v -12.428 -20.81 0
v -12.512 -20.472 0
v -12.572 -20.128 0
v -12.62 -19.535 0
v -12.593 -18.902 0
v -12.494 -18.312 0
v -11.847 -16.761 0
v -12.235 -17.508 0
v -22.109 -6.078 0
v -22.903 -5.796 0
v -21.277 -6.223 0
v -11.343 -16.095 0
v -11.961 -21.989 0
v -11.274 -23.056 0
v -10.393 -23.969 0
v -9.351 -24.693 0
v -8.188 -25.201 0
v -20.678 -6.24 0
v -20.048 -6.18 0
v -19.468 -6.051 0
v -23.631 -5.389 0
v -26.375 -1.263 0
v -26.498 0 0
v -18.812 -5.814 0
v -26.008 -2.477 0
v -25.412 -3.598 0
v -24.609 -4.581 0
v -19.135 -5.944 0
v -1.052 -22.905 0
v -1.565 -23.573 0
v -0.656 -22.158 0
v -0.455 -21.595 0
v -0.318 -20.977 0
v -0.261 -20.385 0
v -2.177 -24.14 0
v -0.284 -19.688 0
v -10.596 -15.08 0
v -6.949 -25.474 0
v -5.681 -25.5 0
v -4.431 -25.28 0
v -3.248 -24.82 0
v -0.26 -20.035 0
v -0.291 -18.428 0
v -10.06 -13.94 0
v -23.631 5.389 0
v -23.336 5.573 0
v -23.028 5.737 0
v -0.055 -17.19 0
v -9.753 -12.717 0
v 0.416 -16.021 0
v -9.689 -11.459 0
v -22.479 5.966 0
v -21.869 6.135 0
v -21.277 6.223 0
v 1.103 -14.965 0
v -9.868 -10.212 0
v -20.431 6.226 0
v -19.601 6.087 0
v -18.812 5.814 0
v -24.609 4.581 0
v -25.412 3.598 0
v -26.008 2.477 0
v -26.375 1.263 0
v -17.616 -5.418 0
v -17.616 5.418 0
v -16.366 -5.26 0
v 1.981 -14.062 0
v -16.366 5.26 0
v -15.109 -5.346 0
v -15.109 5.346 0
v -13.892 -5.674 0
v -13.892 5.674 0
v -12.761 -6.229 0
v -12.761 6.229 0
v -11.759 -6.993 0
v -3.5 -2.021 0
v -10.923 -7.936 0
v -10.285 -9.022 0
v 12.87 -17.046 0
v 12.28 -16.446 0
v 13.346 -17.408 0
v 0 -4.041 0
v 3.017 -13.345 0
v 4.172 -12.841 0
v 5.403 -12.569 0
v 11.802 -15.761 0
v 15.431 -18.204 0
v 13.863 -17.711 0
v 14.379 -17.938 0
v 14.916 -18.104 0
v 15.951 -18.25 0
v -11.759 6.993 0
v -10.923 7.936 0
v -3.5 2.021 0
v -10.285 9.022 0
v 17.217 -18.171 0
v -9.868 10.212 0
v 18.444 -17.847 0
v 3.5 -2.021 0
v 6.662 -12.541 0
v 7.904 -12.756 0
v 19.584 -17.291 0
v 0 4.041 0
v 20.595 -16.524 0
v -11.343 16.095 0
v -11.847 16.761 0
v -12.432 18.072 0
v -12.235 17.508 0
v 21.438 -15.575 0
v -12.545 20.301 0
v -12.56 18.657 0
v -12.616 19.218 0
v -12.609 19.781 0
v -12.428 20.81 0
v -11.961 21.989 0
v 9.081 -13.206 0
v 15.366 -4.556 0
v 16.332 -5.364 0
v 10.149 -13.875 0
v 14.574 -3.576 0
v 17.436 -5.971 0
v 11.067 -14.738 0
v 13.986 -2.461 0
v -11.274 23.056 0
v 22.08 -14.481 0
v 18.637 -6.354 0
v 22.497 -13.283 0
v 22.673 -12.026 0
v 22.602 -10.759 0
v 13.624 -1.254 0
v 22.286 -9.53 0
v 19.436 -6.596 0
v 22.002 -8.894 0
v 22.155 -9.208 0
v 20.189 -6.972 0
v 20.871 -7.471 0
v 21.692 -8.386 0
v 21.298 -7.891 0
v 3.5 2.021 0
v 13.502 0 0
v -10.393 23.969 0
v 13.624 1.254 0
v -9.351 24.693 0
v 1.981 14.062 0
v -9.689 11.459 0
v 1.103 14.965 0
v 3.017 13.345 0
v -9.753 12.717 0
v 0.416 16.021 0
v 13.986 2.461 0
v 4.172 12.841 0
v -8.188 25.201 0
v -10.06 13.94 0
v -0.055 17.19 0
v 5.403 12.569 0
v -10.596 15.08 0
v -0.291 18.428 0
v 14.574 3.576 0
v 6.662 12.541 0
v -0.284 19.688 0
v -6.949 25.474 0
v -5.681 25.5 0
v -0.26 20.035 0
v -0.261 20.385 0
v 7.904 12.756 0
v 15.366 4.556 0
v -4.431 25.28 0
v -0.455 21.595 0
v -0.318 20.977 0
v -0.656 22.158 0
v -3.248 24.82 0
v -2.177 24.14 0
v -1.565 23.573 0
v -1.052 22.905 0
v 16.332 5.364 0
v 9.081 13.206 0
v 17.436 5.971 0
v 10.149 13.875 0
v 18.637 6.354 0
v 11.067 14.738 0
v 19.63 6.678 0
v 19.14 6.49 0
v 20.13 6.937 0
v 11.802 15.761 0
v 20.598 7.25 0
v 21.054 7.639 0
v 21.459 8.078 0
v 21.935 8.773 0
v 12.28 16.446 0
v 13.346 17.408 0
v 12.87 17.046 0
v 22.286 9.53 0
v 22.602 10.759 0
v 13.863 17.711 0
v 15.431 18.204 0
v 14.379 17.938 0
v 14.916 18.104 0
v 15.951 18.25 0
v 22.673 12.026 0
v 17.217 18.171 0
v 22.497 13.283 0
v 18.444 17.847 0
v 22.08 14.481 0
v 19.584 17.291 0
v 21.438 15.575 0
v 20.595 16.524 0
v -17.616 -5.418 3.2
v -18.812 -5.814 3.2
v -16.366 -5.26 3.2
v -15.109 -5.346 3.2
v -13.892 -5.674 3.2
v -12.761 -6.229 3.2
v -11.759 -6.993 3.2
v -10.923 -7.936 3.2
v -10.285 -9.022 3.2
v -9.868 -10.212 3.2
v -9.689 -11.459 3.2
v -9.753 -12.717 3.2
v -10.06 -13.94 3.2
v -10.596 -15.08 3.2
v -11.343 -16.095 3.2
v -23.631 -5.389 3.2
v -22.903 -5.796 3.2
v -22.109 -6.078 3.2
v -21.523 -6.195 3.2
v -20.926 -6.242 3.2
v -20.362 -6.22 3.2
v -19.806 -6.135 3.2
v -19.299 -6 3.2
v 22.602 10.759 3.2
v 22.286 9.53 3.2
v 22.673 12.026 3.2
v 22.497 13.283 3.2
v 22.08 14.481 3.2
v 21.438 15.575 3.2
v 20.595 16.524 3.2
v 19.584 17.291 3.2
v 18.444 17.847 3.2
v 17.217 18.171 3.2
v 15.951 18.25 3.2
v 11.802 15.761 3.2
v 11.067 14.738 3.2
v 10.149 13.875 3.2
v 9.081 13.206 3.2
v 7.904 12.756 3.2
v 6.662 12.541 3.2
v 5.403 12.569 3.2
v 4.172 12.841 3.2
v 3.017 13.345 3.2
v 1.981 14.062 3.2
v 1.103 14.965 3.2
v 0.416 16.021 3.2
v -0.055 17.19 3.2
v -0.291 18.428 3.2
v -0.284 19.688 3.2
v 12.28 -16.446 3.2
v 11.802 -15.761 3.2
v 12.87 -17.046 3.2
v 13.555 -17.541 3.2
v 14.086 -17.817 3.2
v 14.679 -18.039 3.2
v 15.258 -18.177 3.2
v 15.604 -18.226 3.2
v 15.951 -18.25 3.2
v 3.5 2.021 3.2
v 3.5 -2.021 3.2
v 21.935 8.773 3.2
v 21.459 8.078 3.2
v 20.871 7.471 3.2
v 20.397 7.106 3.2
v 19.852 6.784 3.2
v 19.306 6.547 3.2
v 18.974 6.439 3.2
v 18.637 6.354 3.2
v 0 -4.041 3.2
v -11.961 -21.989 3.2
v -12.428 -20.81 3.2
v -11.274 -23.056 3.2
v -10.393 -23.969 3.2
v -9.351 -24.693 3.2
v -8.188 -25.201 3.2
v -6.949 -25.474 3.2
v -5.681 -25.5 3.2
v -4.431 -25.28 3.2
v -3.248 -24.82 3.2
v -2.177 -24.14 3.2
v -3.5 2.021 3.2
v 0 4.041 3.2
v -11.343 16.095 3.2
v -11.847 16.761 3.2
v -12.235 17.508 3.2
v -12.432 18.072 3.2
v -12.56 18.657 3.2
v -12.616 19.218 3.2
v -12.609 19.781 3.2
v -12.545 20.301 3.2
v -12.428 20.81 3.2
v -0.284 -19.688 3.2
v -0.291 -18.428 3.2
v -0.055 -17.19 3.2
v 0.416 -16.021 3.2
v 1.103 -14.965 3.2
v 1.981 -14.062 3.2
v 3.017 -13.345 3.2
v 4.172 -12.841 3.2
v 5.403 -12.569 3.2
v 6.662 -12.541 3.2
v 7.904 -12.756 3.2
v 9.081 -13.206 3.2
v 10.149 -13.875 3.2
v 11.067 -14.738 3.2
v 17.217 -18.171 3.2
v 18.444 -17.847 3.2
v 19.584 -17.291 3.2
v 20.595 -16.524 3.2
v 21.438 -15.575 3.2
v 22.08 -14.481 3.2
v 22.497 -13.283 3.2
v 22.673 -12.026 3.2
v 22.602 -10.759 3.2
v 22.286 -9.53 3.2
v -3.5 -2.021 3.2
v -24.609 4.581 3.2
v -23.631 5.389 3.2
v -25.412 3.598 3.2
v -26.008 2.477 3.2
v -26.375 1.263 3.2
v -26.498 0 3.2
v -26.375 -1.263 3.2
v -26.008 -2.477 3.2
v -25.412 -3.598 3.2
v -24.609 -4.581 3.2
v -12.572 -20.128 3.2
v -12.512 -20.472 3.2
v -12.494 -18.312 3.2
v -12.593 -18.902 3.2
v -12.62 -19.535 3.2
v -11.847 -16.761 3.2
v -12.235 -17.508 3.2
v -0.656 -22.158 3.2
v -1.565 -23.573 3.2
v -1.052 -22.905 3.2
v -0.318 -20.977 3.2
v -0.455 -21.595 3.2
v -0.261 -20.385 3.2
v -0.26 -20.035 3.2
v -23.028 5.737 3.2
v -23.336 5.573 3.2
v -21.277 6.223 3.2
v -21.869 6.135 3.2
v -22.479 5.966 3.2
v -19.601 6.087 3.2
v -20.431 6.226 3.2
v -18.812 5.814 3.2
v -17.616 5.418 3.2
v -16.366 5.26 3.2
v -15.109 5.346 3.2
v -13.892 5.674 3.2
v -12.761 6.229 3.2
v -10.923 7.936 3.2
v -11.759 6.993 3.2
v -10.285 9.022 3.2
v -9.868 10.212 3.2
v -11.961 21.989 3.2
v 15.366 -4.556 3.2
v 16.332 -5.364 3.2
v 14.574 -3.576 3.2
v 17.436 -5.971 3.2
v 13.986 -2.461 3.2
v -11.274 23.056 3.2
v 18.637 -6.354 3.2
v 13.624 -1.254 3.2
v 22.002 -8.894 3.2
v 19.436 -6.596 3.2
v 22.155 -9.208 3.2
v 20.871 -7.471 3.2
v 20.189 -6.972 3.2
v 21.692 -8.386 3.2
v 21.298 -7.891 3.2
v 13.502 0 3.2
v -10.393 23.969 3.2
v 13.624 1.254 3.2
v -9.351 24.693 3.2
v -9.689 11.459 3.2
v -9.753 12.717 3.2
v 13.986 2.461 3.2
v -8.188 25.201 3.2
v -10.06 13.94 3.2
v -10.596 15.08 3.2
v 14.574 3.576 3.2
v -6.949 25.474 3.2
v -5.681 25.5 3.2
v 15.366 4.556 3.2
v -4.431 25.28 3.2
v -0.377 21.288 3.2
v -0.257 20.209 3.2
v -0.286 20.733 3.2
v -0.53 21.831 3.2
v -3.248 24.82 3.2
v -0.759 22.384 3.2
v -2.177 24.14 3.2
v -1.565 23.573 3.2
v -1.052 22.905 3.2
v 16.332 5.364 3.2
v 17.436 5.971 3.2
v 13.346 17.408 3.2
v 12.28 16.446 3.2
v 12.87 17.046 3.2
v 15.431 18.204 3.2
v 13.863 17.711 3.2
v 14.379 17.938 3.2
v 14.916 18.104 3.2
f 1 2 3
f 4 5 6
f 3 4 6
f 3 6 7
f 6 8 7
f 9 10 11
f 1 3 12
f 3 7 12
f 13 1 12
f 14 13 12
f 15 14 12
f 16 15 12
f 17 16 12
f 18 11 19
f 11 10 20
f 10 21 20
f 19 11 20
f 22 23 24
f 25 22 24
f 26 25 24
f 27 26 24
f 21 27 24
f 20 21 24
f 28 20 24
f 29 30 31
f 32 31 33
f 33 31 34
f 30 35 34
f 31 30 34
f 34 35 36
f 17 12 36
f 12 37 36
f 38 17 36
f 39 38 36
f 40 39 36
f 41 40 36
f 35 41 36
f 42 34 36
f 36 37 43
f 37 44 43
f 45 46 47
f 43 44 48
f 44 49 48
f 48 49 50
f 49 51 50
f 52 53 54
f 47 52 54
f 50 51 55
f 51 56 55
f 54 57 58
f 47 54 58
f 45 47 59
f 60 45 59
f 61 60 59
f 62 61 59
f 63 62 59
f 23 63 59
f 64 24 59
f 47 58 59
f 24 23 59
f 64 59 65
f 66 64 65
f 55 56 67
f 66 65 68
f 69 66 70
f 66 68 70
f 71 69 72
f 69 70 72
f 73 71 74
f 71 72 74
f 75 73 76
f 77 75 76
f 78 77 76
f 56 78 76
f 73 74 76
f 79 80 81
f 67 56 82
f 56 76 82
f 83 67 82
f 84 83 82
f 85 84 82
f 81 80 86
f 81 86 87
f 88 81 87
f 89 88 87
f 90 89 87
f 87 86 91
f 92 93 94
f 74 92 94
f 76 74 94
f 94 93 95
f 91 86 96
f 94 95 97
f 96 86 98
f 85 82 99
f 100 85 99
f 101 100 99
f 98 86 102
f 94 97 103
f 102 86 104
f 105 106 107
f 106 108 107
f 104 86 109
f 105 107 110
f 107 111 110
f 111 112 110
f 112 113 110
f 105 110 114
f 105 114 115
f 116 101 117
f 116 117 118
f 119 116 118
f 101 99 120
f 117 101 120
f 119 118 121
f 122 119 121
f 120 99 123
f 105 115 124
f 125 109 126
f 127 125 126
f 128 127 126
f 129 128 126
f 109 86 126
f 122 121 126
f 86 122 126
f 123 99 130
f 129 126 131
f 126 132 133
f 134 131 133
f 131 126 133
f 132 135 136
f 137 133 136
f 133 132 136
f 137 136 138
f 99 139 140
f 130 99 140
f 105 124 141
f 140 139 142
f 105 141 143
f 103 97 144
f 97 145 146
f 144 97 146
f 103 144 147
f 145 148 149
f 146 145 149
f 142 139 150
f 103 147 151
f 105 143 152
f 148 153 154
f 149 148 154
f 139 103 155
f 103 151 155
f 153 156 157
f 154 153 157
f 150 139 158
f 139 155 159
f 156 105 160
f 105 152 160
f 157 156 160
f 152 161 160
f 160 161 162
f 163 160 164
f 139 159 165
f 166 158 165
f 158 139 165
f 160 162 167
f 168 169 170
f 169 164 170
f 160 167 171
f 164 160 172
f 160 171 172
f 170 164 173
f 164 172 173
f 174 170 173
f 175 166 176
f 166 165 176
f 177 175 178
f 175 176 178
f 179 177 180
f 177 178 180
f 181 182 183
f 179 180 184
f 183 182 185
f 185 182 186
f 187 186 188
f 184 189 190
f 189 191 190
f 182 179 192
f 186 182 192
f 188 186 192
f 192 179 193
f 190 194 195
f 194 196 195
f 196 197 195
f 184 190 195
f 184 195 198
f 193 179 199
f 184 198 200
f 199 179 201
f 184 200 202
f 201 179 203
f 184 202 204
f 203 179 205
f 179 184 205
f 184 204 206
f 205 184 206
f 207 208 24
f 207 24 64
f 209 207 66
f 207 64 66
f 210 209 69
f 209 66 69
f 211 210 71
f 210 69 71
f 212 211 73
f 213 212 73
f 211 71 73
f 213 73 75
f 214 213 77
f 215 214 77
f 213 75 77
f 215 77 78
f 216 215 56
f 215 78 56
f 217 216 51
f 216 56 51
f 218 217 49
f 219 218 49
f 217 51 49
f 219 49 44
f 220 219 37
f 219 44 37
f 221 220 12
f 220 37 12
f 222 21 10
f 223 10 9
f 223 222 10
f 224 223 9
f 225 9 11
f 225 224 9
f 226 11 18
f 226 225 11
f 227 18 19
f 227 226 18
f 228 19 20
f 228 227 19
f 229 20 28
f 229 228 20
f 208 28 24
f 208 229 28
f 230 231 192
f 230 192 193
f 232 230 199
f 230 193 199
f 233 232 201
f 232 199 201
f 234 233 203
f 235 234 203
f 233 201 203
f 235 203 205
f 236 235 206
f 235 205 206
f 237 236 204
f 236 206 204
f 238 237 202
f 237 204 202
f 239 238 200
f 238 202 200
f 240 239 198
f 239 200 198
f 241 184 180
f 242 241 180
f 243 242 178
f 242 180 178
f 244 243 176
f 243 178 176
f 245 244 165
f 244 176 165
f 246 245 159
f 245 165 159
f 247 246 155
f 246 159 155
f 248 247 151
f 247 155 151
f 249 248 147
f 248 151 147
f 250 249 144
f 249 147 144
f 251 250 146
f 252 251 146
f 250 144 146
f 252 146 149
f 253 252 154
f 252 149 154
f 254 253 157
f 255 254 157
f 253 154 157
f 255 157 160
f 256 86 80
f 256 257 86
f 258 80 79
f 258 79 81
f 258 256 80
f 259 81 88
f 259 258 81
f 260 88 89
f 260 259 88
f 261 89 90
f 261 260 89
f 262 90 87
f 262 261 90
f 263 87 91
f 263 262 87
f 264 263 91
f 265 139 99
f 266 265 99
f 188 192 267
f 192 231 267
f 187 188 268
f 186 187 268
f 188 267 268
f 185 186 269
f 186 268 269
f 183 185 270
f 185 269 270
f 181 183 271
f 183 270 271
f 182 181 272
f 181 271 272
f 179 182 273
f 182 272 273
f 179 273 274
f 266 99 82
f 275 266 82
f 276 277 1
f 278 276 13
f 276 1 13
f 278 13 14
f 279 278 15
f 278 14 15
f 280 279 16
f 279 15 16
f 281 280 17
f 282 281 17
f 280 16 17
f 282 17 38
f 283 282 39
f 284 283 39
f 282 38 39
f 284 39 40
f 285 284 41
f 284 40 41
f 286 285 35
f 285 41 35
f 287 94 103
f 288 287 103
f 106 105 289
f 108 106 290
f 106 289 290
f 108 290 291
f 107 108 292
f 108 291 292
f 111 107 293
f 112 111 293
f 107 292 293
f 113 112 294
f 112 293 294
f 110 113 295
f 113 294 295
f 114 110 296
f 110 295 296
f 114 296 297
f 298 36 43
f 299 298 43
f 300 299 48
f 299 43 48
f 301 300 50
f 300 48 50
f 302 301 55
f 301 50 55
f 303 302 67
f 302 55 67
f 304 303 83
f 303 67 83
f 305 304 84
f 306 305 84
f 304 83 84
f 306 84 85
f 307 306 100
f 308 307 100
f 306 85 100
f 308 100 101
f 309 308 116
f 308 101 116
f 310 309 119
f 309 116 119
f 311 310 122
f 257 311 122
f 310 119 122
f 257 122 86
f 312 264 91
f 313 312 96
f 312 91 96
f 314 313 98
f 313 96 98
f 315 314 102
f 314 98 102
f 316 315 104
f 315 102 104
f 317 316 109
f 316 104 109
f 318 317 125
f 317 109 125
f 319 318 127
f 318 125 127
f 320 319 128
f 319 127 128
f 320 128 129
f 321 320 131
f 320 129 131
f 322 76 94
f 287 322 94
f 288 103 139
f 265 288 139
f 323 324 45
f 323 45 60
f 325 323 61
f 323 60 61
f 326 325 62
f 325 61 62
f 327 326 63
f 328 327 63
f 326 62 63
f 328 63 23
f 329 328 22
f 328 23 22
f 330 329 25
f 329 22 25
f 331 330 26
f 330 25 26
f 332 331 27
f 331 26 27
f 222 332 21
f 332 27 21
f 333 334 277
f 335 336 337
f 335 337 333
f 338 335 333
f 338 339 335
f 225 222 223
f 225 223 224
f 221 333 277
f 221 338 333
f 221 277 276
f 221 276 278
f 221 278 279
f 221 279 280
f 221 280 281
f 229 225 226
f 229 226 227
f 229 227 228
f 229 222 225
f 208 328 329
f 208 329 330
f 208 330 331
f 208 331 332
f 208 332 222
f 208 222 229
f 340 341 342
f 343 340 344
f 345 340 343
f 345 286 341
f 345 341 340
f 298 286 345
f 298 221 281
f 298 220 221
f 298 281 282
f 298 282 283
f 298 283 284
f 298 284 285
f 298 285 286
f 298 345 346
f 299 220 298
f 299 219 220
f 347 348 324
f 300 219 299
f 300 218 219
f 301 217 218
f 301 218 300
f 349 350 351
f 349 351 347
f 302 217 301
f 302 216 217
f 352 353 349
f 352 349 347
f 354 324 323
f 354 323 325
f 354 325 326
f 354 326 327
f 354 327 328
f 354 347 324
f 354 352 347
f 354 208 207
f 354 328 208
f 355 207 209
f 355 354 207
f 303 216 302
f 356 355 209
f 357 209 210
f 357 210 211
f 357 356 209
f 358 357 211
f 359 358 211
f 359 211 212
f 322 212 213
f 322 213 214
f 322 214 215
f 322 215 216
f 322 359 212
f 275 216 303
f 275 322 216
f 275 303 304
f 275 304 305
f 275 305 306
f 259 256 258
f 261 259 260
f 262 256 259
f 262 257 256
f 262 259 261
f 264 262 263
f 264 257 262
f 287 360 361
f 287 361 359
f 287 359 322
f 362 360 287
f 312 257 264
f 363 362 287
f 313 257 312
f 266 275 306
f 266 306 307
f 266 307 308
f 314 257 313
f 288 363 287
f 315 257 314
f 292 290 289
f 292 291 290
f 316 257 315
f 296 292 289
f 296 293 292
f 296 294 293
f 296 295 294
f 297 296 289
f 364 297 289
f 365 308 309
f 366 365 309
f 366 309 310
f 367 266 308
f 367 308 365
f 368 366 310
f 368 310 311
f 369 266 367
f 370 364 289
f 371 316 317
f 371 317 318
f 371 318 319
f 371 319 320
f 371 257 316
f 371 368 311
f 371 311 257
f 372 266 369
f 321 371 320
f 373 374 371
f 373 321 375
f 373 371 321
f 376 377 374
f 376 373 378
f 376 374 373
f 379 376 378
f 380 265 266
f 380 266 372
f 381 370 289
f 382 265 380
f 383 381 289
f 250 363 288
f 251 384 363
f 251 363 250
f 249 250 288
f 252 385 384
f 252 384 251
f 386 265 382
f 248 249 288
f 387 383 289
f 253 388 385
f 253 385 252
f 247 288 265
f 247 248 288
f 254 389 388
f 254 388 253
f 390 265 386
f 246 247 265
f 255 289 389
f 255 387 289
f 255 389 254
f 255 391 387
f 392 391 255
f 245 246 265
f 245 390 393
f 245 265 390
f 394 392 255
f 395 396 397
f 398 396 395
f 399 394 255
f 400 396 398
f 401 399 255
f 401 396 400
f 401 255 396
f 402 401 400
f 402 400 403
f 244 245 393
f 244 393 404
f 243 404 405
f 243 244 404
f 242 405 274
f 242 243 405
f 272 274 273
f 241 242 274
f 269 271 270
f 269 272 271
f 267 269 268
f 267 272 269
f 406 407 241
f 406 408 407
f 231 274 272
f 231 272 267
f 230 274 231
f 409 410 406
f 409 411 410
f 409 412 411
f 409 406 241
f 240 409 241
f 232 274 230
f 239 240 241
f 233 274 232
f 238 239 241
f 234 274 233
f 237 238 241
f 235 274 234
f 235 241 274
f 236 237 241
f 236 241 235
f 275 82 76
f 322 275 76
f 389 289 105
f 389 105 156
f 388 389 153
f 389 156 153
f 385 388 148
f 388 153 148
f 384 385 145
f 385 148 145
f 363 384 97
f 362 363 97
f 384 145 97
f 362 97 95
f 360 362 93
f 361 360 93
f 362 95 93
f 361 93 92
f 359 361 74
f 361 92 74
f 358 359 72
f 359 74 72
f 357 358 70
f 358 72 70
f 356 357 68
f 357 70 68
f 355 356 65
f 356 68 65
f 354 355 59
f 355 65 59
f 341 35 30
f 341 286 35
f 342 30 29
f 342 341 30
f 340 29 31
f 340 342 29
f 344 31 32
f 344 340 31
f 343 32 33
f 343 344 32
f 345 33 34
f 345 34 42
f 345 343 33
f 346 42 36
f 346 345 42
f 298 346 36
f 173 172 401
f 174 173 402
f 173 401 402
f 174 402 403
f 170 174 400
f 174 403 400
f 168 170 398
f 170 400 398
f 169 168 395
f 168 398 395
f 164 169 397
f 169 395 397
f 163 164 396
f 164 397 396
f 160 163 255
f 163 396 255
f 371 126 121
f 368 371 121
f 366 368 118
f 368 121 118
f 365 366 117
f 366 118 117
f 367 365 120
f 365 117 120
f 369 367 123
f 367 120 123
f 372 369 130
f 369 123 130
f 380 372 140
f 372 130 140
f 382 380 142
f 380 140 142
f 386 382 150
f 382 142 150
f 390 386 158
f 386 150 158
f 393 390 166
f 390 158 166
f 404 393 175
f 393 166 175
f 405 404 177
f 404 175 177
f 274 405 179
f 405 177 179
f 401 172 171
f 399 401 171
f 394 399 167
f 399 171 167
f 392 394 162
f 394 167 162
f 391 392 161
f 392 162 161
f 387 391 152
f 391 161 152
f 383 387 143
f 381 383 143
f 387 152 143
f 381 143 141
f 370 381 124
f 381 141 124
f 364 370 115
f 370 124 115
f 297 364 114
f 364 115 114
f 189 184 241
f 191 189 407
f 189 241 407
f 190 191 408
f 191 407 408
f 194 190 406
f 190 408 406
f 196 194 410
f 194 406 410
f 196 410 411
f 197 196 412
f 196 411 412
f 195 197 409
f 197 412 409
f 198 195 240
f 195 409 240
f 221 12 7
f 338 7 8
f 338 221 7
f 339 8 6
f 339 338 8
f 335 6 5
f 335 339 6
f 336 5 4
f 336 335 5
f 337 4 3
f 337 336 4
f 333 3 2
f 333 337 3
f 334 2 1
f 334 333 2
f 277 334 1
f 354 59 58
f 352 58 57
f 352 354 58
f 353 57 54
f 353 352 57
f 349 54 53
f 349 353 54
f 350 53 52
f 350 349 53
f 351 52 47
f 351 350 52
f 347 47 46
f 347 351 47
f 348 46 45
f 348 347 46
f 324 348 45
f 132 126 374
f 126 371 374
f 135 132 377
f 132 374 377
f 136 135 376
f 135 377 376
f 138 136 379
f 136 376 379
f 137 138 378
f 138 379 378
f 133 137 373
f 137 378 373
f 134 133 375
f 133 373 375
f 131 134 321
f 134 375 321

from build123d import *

# Parameters (mm, degrees)
F1_DEPTH = 3.2
F2_R     = 5


with BuildPart() as f1:
    # F0 (on Top) → F1 (new body)
    with BuildSketch(Plane.XY):
        with BuildLine():
            ThreePointArc((-12.36068, 17.013016), (-10.923029, 7.936045), (-20, 6.498394))
            ThreePointArc((-20, 6.498394), (-26.498394, 0), (-20, -6.498394))
            ThreePointArc((-20, -6.498394), (-10.923029, -7.936045), (-12.36068, -17.013016))
            ThreePointArc((-12.36068, -17.013016), (-8.188454, -25.20147), (0, -21.029244))
            ThreePointArc((0, -21.029244), (4.172226, -12.84079), (12.36068, -17.013016))
            ThreePointArc((12.36068, -17.013016), (21.437651, -15.575365), (20, -6.498394))
            ThreePointArc((20, -6.498394), (13.501606, 0), (20, 6.498394))
            ThreePointArc((20, 6.498394), (21.437651, 15.575365), (12.36068, 17.013016))
            ThreePointArc((12.36068, 17.013016), (4.172226, 12.84079), (0, 21.029244))
            ThreePointArc((0, 21.029244), (-8.188454, 25.20147), (-12.36068, 17.013016))
        make_face()
        Polygon((0, 4.041452), (3.5, 2.020726), (3.5, -2.020726), (0, -4.041452), (-3.5, -2.020726), (-3.5, 2.020726), align=None, mode=Mode.SUBTRACT)
    extrude(amount=F1_DEPTH)

    # F2
    f2_edges = [f1.edges().sort_by_distance(p)[0] for p in [
        (-12.36068, 17.013016, 1.6),
        (-20, 6.498394, 1.6),
        (0, 21.029244, 1.6),
        (12.36068, 17.013016, 1.6),
        (20, 6.498394, 1.6),
        (20, -6.498394, 1.6),
        (12.36068, -17.013016, 1.6),
        (0, -21.029244, 1.6),
        (-12.36068, -17.013016, 1.6),
        (-20, -6.498394, 1.6),
    ]]
    fillet(f2_edges, radius=F2_R)


solid = f1.part
